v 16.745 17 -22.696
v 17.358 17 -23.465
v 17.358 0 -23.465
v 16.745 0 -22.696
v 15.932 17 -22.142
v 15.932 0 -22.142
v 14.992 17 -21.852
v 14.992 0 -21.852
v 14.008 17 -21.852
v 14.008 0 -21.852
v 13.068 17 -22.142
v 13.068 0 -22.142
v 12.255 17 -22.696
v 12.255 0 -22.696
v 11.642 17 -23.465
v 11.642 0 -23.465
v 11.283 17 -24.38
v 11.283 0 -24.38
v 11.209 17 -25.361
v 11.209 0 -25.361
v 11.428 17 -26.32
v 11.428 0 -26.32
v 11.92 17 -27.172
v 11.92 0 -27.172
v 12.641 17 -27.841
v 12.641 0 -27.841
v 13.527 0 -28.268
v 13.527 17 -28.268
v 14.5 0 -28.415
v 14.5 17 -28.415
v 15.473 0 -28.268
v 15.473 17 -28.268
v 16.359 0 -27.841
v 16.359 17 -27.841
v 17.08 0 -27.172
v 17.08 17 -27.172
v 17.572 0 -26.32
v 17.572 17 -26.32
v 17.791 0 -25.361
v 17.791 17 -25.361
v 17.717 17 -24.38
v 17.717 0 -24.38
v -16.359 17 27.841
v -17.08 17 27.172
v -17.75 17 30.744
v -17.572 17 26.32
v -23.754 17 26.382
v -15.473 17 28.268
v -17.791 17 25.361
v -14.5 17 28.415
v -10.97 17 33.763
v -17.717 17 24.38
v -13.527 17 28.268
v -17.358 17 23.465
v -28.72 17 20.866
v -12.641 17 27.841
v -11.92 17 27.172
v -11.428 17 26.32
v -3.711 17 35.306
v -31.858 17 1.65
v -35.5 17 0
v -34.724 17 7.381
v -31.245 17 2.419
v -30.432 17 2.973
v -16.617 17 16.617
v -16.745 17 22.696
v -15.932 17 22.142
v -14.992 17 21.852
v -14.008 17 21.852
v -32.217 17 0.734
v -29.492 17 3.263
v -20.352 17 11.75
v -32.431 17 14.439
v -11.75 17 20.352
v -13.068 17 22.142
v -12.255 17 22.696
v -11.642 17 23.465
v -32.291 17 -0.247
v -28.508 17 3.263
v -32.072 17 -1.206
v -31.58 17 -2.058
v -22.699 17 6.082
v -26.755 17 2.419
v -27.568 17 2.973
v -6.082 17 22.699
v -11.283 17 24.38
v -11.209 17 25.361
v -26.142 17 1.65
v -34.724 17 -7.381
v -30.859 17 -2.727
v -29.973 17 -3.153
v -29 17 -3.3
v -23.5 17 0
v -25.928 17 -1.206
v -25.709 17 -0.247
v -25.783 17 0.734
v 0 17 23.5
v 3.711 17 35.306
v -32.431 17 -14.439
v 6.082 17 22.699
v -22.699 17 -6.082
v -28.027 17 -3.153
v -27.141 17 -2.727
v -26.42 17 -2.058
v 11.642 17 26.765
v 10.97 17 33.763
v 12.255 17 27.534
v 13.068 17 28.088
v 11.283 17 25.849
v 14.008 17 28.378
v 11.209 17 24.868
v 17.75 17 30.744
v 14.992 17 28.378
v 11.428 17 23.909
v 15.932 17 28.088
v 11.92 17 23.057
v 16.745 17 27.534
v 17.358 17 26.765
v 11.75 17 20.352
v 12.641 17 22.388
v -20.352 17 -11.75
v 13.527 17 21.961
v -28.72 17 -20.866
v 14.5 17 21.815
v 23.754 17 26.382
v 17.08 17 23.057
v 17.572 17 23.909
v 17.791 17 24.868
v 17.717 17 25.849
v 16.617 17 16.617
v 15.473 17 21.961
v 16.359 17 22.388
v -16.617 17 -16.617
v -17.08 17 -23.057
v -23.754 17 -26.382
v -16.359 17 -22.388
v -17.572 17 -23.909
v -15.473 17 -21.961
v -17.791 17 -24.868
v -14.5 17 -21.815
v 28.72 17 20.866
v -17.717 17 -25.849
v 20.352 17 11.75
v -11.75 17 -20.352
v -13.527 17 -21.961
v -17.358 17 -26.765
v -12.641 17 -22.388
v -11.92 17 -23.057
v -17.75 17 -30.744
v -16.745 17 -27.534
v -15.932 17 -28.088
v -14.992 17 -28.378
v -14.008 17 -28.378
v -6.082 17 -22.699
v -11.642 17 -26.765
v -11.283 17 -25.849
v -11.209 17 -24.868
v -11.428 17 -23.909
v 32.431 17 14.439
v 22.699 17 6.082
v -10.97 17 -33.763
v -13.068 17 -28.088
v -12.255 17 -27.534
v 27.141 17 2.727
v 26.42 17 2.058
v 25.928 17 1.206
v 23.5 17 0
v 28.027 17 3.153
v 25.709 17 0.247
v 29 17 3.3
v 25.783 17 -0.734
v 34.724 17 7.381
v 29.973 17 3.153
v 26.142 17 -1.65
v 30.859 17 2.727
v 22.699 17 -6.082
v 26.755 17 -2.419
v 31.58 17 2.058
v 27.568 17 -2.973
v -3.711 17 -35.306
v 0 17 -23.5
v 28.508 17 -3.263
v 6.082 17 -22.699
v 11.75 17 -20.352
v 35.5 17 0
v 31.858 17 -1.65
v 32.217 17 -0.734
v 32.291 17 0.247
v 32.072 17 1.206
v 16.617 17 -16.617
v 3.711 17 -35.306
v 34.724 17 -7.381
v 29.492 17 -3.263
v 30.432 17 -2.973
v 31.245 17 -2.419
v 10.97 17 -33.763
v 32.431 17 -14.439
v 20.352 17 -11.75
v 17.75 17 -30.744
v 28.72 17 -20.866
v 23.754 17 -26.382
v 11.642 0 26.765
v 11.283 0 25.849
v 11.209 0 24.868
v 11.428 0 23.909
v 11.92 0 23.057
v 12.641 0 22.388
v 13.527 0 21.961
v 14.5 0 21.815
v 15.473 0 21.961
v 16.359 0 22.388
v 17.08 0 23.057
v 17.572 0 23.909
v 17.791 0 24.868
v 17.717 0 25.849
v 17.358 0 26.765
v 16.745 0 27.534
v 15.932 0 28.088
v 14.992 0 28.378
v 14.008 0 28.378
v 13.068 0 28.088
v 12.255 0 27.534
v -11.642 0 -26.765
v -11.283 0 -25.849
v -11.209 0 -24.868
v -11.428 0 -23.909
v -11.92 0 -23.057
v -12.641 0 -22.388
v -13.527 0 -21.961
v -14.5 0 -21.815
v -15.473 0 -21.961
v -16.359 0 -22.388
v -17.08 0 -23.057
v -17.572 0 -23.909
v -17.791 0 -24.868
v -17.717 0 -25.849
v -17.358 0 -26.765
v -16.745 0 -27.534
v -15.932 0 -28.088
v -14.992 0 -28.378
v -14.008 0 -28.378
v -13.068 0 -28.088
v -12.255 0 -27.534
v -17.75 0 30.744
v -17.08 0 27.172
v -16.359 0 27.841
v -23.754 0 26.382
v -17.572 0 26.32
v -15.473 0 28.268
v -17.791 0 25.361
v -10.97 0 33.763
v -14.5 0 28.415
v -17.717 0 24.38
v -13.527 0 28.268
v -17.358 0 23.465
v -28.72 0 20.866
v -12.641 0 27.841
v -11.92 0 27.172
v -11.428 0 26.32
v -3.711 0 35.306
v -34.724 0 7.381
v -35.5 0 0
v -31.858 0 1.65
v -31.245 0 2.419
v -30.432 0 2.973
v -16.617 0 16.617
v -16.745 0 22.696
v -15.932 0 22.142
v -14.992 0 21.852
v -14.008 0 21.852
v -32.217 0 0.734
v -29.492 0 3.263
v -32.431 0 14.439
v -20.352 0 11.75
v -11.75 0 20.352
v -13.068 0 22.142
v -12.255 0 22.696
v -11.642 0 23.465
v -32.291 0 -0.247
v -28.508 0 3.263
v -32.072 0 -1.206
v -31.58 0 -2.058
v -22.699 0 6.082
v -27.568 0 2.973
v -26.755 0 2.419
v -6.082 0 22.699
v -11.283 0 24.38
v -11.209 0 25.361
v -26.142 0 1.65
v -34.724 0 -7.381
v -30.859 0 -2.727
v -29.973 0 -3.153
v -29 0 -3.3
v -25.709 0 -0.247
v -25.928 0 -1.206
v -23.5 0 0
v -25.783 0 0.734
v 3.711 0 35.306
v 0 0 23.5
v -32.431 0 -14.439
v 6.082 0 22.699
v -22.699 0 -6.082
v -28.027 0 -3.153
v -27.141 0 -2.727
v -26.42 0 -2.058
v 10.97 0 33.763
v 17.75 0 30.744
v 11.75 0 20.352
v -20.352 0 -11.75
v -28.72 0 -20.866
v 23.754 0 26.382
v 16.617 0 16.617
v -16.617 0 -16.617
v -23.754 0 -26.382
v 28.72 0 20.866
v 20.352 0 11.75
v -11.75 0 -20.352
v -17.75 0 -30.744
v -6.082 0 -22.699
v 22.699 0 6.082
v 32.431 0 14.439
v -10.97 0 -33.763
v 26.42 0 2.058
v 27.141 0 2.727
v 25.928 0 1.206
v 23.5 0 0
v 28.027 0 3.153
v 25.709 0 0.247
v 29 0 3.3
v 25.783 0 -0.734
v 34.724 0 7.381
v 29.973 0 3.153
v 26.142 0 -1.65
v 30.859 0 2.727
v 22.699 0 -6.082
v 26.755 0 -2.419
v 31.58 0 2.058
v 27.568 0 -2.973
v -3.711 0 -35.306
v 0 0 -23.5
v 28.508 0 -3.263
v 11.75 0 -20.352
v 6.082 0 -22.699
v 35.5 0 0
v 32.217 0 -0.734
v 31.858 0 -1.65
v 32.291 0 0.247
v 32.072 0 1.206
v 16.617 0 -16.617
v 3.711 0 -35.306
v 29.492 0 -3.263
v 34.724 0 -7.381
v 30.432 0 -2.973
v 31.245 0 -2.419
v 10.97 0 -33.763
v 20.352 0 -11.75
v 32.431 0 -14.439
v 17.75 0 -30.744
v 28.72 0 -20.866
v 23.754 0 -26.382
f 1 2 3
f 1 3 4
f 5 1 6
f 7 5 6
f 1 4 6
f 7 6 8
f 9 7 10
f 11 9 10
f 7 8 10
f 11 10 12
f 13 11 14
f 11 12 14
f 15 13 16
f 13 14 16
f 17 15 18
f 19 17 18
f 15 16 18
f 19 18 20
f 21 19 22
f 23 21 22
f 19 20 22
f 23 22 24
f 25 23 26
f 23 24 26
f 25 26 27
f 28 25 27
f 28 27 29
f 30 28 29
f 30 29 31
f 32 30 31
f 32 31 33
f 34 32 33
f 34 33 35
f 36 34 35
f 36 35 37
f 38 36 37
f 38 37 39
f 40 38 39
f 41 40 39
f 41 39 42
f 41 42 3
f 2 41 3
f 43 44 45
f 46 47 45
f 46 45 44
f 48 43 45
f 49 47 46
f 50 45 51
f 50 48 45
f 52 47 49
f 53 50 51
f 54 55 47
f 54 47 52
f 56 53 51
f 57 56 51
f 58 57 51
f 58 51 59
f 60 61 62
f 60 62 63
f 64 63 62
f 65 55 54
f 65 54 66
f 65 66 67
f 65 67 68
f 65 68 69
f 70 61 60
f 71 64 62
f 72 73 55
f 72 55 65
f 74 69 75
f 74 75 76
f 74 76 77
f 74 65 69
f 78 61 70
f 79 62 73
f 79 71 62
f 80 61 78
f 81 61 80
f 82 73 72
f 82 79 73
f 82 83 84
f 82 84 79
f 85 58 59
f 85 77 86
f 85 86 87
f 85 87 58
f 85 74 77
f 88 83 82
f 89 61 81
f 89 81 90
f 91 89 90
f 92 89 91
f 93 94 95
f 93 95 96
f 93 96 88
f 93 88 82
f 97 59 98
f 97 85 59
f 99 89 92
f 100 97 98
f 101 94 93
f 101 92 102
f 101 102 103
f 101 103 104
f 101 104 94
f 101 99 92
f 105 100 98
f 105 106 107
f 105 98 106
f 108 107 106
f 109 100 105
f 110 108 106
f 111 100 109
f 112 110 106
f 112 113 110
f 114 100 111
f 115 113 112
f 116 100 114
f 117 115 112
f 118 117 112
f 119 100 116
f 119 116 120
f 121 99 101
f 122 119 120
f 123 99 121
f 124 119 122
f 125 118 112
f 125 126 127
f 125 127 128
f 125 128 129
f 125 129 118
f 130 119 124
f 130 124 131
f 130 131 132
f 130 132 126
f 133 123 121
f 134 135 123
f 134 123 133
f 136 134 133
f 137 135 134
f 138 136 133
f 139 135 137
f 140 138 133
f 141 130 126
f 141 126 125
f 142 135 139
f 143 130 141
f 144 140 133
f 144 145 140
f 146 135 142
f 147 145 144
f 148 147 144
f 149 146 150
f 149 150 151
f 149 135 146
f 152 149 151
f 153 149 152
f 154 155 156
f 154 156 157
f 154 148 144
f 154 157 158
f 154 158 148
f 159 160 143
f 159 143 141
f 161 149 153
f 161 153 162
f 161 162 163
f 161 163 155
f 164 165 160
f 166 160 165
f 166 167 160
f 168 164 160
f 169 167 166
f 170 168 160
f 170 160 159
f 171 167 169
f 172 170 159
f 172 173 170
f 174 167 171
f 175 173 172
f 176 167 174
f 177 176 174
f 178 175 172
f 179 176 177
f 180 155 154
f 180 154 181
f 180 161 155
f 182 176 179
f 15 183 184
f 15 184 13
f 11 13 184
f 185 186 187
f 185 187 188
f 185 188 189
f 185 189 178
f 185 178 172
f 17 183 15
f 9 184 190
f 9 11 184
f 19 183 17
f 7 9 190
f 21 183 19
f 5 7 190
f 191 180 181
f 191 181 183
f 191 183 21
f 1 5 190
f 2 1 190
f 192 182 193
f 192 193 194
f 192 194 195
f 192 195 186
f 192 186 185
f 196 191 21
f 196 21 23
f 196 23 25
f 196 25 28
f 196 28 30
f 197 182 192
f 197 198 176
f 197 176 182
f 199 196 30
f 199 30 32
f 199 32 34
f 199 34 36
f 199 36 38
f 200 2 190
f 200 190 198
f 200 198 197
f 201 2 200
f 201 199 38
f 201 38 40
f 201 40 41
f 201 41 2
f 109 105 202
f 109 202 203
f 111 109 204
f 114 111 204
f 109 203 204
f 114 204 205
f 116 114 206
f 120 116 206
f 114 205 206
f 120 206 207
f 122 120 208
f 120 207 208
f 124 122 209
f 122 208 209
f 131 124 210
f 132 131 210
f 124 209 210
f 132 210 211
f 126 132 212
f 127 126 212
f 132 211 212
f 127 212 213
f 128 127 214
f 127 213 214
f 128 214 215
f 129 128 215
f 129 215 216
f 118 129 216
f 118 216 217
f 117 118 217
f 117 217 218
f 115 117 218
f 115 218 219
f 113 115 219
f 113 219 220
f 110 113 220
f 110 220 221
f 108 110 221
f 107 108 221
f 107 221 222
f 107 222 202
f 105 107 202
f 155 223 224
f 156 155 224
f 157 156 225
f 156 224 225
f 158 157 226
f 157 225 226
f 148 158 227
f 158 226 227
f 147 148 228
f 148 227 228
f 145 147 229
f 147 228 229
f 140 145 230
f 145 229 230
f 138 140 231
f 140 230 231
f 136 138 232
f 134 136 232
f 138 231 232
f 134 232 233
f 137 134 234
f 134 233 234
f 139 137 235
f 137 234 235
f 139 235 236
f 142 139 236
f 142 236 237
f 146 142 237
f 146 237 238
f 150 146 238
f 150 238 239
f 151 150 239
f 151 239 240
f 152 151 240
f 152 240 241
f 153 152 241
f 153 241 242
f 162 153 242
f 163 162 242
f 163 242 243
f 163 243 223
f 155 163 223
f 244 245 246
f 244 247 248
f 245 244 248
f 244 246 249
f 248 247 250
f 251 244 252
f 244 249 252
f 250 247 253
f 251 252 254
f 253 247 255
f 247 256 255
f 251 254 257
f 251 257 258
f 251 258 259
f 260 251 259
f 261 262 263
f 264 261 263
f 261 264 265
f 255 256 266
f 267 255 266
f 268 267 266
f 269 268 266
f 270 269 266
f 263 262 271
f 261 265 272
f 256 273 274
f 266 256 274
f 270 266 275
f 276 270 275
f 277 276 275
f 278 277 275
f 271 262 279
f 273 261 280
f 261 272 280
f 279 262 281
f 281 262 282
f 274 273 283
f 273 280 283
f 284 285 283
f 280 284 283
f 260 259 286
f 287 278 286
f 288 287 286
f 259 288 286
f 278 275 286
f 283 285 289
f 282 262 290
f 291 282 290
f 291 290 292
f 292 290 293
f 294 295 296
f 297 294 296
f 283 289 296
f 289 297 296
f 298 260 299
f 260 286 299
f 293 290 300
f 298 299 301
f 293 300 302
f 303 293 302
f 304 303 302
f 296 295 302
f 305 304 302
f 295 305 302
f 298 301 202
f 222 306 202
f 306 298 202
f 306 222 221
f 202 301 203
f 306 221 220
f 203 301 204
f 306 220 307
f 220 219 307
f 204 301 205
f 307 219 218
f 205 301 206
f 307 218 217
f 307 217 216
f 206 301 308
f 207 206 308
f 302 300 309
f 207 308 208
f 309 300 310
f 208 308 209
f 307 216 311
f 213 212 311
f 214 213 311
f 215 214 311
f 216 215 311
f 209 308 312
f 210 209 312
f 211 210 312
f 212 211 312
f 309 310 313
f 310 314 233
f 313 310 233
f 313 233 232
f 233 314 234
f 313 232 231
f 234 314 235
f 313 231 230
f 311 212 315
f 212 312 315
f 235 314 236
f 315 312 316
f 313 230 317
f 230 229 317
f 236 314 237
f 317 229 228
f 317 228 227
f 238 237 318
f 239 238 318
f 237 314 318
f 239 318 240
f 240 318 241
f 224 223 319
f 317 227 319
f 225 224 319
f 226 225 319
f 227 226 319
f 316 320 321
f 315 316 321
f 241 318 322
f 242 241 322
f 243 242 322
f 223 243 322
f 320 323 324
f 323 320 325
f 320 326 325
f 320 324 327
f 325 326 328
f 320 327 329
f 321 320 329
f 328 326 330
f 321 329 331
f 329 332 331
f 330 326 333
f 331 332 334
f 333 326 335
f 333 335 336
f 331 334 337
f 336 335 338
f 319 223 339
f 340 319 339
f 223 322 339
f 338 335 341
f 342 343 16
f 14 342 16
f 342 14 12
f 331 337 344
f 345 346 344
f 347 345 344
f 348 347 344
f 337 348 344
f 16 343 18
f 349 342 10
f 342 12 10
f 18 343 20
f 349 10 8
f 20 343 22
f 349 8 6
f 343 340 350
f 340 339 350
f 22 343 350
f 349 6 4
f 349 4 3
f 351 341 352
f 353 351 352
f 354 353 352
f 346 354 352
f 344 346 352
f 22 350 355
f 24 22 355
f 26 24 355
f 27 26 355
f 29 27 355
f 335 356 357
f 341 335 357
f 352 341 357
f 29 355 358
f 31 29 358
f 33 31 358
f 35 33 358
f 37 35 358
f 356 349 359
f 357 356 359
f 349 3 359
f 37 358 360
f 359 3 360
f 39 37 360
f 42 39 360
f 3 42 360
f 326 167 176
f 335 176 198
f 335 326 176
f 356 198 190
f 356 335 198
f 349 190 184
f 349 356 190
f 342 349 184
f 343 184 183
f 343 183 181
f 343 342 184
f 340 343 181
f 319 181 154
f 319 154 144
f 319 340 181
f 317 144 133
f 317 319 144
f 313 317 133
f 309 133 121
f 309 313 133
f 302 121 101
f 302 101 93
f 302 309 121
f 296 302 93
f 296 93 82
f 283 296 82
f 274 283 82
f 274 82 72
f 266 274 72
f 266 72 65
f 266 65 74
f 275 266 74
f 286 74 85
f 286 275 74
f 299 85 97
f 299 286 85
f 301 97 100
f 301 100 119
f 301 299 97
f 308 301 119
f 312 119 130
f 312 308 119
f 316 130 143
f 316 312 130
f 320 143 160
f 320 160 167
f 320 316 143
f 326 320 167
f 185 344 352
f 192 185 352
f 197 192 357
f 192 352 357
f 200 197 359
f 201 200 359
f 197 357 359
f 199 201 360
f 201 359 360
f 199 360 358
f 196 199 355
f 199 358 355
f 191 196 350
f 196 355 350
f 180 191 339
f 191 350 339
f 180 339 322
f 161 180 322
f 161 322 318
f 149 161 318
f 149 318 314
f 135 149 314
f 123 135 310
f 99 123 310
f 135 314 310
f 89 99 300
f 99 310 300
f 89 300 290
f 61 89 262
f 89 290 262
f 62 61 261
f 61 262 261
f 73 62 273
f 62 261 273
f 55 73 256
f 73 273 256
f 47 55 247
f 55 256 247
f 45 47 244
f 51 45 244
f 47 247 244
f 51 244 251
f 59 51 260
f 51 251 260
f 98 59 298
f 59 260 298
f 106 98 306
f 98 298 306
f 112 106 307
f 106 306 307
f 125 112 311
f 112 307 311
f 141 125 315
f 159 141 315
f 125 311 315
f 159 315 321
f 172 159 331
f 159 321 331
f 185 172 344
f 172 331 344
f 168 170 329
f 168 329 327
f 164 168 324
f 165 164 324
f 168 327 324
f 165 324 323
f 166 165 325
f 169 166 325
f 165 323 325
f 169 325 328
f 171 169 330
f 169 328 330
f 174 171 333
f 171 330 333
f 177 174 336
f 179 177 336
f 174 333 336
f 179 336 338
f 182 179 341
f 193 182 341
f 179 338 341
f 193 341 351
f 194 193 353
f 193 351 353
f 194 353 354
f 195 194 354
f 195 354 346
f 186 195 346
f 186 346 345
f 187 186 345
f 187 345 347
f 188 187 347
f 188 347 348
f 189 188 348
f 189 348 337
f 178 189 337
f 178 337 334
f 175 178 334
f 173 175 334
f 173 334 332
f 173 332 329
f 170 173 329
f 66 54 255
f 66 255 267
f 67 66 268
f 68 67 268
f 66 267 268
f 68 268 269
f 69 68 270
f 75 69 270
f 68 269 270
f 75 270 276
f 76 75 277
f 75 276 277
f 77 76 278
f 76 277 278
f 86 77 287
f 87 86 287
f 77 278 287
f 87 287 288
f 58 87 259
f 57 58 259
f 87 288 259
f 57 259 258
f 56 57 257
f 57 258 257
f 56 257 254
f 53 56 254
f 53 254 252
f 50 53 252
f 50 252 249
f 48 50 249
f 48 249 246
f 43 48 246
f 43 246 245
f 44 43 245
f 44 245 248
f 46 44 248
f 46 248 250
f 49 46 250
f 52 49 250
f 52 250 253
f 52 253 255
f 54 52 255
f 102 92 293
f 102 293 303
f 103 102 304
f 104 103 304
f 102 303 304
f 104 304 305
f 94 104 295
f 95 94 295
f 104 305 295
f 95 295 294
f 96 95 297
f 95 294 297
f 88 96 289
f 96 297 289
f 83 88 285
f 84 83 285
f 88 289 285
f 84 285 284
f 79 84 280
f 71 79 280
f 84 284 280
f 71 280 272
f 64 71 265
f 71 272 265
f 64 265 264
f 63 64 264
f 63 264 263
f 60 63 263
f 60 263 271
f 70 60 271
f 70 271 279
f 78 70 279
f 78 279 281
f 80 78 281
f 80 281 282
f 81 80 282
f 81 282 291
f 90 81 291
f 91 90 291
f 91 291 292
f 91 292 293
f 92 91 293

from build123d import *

# Parameters (mm, degrees)
SKETCH1_R                = 35.5
SKETCH1_R_2              = 23.5
BOSS_EXTRUDE1_DEPTH      = 17
M6_CLEARANCE_HOLE1_D     = 6.6
M6_CLEARANCE_HOLE1_DEPTH = 17
CIRPATTERN1_COUNT        = 6


with BuildPart() as part:
    # Sketch1 → Boss-Extrude1 (new body)
    with BuildSketch(Plane(origin=(0, 0, 0), x_dir=(1, 0, 0), z_dir=(0, 1, 0))):
        Circle(SKETCH1_R)
        Circle(SKETCH1_R_2, mode=Mode.SUBTRACT)
    extrude(amount=BOSS_EXTRUDE1_DEPTH)

    # M6 Clearance Hole1
    with Locations(Plane(origin=(-29, 17, 0), x_dir=(0, 0, 1), z_dir=(0, 1, 0))):
        with Locations((0, 0)):
            m6_clearance_hole1 = Hole(M6_CLEARANCE_HOLE1_D / 2, depth=M6_CLEARANCE_HOLE1_DEPTH)

    # CirPattern1: M6 Clearance Hole1 ×6 about axis
    cirpattern1_axis = Axis((0, 0, 0), (0, 1, 0))
    for i in range(1, CIRPATTERN1_COUNT):
        add(m6_clearance_hole1.rotate(cirpattern1_axis, i * 360 / CIRPATTERN1_COUNT), mode=Mode.SUBTRACT)


solid = part.part
